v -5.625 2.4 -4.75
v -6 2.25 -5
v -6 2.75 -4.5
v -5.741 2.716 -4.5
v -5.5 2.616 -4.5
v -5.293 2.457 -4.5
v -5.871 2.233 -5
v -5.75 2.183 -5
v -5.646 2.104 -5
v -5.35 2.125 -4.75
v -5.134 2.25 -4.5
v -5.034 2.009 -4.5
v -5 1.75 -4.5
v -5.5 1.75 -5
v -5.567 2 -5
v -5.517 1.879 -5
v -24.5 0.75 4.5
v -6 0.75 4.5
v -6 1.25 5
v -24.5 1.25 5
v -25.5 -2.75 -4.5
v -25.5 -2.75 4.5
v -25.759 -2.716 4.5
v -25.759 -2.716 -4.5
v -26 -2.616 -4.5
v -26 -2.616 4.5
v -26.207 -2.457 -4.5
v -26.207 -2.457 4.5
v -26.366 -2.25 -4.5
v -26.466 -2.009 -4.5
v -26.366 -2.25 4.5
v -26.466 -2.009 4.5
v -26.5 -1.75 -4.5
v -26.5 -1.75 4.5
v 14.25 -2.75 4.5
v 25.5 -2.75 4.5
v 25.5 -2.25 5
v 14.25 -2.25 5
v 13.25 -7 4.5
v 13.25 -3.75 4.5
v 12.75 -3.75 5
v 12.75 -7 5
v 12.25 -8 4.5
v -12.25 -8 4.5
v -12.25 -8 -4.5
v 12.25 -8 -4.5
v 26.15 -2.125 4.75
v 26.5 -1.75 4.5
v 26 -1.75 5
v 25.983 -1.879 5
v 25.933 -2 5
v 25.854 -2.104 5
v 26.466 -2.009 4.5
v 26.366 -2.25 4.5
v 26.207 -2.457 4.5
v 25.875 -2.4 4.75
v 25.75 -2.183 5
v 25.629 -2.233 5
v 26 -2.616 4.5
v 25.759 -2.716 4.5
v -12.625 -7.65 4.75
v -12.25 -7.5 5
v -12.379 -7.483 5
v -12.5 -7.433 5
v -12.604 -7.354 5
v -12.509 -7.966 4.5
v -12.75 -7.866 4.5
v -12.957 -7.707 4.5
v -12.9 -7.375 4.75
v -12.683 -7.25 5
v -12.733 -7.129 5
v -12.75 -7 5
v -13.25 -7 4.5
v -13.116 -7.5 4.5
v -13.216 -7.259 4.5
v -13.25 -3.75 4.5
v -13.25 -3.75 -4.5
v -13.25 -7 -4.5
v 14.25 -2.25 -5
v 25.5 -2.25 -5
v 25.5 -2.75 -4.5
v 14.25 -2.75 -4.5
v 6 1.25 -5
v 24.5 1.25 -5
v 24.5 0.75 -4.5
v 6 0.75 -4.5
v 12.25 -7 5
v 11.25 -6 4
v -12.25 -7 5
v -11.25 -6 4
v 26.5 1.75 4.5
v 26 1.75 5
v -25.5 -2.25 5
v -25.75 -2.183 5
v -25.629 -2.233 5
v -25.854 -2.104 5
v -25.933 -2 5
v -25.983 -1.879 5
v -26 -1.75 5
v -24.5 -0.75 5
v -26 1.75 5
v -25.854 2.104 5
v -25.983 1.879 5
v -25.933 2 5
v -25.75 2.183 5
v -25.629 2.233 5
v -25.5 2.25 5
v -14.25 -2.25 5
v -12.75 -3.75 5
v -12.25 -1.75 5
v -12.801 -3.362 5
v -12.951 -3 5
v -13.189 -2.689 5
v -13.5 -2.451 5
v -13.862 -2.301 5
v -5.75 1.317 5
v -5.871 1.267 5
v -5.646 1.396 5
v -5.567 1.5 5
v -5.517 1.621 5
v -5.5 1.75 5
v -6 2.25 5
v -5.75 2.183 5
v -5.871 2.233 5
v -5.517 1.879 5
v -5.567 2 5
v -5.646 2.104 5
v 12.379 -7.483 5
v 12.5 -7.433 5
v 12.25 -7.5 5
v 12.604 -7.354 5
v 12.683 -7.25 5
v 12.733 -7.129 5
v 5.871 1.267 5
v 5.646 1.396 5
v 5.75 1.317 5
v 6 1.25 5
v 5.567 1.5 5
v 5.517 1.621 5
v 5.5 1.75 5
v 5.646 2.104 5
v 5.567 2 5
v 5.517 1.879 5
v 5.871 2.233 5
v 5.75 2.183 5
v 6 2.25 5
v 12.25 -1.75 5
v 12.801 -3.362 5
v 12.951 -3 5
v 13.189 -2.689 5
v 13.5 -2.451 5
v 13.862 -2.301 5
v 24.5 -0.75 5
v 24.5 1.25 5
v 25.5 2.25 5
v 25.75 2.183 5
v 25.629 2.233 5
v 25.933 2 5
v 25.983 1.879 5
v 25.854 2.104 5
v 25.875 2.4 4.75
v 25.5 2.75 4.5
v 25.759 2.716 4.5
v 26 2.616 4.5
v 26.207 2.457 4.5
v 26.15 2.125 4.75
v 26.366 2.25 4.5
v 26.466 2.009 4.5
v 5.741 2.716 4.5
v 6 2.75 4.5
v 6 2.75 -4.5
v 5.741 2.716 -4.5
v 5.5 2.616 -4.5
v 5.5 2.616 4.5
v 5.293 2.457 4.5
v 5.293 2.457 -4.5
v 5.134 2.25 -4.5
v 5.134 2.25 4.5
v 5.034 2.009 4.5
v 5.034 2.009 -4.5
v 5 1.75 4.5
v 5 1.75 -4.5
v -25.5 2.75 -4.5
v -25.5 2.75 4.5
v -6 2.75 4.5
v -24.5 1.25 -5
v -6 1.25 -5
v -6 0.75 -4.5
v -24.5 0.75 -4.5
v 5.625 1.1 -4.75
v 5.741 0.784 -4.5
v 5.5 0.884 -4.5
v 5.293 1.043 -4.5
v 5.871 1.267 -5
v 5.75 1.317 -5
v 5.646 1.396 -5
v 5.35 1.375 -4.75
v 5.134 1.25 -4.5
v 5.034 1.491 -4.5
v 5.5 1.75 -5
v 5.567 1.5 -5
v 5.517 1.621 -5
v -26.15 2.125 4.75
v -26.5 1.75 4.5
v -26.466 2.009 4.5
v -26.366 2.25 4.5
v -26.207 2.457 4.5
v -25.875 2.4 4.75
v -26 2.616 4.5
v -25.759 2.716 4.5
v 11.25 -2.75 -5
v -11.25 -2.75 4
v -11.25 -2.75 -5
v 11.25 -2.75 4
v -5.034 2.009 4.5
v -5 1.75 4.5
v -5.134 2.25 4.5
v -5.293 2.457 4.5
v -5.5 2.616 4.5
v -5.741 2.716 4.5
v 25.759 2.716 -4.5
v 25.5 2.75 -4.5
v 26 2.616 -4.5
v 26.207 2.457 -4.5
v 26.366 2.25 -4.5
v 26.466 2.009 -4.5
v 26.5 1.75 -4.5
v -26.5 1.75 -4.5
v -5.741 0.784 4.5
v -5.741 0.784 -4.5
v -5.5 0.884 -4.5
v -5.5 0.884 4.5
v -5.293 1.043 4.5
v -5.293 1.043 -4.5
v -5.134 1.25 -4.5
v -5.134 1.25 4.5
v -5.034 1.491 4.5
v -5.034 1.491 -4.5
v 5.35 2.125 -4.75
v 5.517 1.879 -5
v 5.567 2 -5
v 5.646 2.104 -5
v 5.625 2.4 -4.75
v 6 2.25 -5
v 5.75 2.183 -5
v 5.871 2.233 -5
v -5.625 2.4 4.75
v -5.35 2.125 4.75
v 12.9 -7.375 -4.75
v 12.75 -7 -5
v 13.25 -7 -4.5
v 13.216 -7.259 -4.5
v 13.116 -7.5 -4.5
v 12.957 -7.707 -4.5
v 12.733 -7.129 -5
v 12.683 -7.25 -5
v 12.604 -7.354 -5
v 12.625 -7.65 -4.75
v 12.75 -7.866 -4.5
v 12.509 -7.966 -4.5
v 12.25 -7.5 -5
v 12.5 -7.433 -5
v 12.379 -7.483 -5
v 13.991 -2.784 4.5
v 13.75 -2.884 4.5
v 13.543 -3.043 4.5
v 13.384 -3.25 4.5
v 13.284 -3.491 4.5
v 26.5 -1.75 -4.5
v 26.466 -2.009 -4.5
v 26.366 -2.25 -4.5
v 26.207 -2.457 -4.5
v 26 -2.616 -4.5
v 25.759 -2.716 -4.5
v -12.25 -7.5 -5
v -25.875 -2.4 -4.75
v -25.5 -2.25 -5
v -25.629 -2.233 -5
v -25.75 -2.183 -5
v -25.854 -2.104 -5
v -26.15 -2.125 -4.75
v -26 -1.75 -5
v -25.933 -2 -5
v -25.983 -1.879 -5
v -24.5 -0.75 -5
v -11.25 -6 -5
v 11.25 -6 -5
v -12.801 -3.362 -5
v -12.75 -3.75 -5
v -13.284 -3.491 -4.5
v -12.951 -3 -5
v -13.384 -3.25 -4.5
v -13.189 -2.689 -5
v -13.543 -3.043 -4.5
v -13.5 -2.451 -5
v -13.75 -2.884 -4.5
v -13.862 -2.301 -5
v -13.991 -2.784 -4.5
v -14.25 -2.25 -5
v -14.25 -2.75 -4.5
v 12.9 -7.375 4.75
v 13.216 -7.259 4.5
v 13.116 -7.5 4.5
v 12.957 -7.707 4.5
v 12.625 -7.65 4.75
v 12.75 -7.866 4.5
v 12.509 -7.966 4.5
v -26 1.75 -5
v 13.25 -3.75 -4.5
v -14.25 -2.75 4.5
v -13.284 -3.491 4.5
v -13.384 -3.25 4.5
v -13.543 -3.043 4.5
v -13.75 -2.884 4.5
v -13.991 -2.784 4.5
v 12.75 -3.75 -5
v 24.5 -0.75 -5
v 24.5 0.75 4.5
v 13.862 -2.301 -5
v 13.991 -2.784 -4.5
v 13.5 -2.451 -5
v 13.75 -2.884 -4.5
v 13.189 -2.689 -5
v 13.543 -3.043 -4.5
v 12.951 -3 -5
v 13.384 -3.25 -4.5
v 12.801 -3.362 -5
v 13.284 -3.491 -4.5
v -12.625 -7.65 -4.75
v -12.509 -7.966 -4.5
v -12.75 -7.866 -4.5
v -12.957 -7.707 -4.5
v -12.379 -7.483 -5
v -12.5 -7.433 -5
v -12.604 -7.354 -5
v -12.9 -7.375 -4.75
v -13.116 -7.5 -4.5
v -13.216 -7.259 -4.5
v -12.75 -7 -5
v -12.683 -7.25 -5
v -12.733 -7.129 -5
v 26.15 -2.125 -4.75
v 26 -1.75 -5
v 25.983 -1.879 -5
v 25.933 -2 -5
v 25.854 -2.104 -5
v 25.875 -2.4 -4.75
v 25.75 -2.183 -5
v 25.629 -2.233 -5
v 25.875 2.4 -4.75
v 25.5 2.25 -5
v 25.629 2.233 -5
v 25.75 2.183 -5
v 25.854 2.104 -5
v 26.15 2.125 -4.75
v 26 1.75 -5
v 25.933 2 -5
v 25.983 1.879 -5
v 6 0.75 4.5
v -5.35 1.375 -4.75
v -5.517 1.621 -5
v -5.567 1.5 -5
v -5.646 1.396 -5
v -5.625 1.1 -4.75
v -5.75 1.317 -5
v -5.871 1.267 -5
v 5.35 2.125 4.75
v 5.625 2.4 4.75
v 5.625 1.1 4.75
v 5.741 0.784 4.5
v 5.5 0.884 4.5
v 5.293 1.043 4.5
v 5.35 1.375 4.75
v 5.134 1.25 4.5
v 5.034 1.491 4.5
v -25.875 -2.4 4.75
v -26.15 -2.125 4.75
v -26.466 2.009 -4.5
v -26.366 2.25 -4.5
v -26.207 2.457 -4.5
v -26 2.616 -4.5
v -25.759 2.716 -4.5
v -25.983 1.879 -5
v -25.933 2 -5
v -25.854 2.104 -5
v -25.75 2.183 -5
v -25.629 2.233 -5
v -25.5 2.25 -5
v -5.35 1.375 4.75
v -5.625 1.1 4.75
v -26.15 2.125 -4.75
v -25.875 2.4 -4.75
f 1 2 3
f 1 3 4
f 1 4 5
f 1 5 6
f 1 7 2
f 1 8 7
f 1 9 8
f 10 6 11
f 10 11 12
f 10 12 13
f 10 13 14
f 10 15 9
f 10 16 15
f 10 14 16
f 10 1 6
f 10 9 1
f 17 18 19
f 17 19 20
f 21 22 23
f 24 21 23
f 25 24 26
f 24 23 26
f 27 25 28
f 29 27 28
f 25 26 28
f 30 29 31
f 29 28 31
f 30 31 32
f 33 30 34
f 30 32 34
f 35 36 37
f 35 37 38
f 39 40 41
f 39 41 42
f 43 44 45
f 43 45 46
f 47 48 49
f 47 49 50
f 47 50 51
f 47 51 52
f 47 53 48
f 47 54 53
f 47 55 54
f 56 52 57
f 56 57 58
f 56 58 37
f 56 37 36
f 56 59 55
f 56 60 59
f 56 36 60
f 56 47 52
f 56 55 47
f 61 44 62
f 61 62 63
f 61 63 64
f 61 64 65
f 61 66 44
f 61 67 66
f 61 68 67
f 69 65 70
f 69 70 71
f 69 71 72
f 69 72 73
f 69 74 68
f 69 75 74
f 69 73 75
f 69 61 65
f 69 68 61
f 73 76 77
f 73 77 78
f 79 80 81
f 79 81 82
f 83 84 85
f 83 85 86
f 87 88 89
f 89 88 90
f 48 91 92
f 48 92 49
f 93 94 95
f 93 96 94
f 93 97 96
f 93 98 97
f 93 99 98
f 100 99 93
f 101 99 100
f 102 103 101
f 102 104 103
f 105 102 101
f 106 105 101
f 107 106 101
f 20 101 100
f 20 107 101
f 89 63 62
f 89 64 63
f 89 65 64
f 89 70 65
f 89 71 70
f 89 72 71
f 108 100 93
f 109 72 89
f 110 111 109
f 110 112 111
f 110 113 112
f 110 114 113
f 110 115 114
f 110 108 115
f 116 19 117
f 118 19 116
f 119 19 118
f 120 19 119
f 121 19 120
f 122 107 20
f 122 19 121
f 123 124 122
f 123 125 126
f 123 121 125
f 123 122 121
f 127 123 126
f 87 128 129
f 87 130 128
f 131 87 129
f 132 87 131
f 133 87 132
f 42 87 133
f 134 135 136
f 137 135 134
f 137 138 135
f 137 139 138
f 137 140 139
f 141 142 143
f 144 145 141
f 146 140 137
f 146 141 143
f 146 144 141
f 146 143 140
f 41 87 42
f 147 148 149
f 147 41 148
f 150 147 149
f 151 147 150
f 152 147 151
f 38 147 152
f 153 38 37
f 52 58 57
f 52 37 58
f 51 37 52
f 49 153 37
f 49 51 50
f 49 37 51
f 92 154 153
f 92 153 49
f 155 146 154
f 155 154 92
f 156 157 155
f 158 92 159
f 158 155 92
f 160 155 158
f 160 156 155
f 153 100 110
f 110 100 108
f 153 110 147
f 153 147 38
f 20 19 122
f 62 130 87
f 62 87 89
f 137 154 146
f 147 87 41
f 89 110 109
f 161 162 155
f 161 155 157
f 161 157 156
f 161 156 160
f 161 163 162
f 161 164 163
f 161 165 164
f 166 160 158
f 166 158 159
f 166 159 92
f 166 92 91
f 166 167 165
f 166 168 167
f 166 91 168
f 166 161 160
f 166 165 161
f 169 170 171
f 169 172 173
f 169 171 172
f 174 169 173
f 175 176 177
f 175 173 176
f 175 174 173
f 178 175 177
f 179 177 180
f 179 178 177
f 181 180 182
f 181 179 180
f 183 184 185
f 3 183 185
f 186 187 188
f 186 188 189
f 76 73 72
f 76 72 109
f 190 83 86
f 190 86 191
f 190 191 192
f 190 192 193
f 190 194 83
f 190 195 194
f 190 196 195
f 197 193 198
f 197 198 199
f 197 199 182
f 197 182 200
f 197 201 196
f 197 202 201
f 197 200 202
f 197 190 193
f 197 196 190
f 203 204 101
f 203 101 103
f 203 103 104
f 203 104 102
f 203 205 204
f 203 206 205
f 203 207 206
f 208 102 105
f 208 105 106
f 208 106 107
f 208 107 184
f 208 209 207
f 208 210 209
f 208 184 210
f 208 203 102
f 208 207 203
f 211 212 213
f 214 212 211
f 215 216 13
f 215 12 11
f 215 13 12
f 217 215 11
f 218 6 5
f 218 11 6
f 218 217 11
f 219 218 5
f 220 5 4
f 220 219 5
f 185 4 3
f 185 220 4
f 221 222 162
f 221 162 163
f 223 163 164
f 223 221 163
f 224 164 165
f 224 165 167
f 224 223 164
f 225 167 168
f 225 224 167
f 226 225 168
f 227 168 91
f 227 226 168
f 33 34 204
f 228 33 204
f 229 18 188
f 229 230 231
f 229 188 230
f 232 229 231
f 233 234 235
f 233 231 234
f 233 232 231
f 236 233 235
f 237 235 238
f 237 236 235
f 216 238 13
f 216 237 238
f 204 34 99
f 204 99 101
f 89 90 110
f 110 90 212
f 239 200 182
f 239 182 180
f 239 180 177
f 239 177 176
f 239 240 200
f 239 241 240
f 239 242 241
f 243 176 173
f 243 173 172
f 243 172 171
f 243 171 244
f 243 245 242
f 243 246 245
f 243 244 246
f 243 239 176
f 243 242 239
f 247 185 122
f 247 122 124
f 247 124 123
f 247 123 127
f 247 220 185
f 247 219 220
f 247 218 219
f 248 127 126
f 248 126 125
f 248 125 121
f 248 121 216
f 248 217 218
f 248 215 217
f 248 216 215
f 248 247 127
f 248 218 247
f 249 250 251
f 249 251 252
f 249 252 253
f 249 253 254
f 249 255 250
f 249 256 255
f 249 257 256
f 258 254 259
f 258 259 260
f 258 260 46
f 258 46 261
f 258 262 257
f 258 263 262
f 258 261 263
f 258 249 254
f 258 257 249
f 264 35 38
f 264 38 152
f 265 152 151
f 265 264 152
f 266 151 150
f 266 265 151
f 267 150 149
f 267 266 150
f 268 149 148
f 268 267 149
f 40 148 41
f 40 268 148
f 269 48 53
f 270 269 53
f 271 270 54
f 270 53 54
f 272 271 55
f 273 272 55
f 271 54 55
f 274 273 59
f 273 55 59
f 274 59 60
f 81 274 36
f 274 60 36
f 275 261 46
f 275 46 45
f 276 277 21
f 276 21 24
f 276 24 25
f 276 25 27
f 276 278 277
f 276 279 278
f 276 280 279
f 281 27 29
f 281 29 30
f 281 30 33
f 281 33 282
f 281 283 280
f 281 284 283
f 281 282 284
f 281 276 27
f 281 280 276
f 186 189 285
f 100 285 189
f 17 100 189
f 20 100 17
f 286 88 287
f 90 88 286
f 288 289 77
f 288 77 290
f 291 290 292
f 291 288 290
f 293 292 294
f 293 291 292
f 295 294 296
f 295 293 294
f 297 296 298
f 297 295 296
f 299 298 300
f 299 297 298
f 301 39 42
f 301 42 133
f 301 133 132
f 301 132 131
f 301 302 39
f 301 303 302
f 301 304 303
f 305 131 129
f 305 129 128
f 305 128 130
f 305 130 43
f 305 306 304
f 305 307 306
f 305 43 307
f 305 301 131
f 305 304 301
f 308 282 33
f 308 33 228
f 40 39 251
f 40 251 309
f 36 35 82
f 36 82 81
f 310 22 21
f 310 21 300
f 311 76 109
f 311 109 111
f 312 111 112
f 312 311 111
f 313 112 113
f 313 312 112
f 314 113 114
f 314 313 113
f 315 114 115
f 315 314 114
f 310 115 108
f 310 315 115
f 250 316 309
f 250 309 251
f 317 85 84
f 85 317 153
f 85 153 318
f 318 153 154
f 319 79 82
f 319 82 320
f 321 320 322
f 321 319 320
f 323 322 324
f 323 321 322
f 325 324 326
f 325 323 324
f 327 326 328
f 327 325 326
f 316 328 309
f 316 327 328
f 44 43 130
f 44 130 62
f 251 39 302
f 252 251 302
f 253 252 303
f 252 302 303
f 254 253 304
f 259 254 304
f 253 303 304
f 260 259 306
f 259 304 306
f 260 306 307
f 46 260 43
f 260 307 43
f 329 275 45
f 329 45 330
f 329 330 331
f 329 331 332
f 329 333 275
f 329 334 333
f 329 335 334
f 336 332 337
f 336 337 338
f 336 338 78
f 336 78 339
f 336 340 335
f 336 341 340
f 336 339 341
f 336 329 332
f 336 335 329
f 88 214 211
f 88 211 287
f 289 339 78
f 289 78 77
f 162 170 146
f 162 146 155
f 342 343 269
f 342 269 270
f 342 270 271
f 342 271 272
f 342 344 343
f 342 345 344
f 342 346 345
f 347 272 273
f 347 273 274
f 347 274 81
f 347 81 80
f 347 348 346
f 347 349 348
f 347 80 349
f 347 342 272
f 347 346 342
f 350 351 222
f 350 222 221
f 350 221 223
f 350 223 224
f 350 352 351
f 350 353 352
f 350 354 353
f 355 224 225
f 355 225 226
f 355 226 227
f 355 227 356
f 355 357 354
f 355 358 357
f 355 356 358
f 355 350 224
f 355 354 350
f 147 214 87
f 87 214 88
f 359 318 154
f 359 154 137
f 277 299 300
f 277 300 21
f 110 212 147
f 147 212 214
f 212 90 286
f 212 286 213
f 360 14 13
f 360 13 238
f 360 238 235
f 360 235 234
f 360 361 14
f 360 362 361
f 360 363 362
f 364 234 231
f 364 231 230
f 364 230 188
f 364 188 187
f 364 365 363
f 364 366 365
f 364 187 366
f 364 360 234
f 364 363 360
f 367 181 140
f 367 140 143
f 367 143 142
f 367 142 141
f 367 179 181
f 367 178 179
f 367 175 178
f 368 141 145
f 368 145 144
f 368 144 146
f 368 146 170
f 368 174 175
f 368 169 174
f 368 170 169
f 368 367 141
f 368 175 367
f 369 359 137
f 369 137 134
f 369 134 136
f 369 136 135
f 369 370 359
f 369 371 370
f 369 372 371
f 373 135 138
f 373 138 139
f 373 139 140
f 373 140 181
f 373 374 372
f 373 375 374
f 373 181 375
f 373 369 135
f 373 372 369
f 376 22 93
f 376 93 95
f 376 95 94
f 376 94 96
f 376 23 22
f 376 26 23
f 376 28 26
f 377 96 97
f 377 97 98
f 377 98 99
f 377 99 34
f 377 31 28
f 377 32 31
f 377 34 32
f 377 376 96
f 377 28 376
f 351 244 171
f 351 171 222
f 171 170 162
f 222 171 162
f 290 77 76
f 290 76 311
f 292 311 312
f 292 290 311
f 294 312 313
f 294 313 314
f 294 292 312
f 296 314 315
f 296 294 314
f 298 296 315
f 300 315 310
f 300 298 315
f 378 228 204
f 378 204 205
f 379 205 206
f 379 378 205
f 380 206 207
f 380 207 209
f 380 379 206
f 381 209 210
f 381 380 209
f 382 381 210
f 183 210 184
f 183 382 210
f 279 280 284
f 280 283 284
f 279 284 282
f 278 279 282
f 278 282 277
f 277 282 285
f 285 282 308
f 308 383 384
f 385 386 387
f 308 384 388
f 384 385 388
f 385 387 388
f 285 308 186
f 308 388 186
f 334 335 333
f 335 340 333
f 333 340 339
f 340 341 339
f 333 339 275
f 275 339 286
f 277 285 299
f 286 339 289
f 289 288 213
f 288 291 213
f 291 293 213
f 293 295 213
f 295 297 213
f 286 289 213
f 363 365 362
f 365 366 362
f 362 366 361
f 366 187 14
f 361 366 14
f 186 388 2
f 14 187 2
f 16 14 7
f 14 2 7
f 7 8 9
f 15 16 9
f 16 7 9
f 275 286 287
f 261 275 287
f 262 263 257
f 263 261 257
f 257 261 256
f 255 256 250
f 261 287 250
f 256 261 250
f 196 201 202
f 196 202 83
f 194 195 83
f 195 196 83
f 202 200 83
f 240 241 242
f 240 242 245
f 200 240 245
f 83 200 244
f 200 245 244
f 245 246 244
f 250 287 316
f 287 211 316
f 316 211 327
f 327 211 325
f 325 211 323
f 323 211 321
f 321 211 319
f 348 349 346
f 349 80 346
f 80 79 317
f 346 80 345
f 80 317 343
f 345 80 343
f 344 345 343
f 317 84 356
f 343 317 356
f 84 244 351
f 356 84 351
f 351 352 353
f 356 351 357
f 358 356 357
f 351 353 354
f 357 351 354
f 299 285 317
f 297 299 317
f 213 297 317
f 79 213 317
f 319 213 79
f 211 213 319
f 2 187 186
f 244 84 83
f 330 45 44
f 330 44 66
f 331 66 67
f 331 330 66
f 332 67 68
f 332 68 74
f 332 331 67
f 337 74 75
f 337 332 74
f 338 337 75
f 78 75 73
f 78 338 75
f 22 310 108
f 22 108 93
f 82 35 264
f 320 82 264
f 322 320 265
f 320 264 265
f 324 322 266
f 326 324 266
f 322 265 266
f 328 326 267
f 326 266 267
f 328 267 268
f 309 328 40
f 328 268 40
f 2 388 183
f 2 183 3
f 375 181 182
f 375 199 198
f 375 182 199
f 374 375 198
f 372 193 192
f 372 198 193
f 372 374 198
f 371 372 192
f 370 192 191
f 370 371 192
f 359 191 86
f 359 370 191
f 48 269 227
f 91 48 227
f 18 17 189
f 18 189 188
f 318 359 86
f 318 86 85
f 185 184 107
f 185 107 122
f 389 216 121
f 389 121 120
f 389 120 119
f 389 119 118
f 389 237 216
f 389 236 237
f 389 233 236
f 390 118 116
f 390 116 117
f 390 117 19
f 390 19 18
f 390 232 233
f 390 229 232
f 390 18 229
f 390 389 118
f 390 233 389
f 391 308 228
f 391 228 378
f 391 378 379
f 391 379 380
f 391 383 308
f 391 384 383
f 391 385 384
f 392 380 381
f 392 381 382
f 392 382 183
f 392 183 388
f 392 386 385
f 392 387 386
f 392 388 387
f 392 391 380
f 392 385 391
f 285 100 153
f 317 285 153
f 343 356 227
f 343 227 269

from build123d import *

# Parameters (mm, degrees)
F0_W          = 53
F0_H          = 5.5
F0_W_2        = 49
F0_H_2        = 1.5
F1_DEPTH      = 5
F2_W          = 10
F2_H          = 10
F3_DEPTH      = 2
F5_DEPTH      = 5
F5_DEPTH_BACK = 5
F6_SIZE       = 1
F7_R          = 0.99999
F8_R          = 1
F9_SIZE       = 0.5


# Not quite as in the source:
# - a fillet or chamfer is up to 0.001 mm smaller than in the source, because OpenCascade refuses the exact size


with BuildPart() as f1:
    # F0 (on Top) → F1 (new body, symmetric)
    with BuildSketch(Plane.XY):
        Rectangle(F0_W, F0_H)
        Rectangle(F0_W_2, F0_H_2, mode=Mode.SUBTRACT)
    extrude(amount=F1_DEPTH, both=True)

    # F2 (on face) → F3 (cut, through all)
    with BuildSketch(Plane(origin=(0, 2.75, 0), x_dir=(-1, 0, 0), z_dir=(0, 1, 0))):
        Rectangle(F2_W, F2_H)
    extrude(amount=-F3_DEPTH, mode=Mode.SUBTRACT)

    # F4 (on Top) → F5 (join, two sides)
    with BuildSketch(Plane.XY) as f5_sk:
        Polygon((-13.25, -8), (13.25, -8), (13.25, -2.75), (11.25, -2.75), (11.25, -6), (-11.25, -6), (-11.25, -2.75), (-13.25, -2.75), align=None)
    extrude(amount=F5_DEPTH)
    extrude(f5_sk.sketch, amount=-F5_DEPTH_BACK)

    # F6
    f6_edges = [f1.edges().sort_by_distance(p)[0] for p in [
        (0, -2.75, 5),
        (0, -6, 5),
        (11.25, -4.375, 5),
        (-11.25, -4.375, 5),
    ]]
    chamfer(f6_edges, length=F6_SIZE)

    # F7 (radius 1 in the source; OpenCascade refuses exactly that, so slightly less here)
    f7_edges = [f1.edges().sort_by_distance(p)[0] for p in [
        (-5, 2.75, 0),
        (5, 0.75, 0),
        (5, 2.75, 0),
        (-5, 0.75, 0),
    ]]
    fillet(f7_edges, radius=F7_R)

    # F8
    f8_edges = [f1.edges().sort_by_distance(p)[0] for p in [
        (-13.25, -2.75, 0),
        (-26.5, -2.75, 0),
        (26.5, -2.75, 0),
        (-13.25, -8, 0),
        (26.5, 2.75, 0),
        (13.25, -8, 0),
        (13.25, -2.75, 0),
        (-26.5, 2.75, 0),
    ]]
    fillet(f8_edges, radius=F8_R)

    # F9
    f9_edges = [f1.edges().sort_by_distance(p)[0] for p in [
        (-15.749995, 2.75, -5),
        (-15.749995, 2.75, 5),
    ]]
    chamfer(f9_edges, length=F9_SIZE)


solid = f1.part
